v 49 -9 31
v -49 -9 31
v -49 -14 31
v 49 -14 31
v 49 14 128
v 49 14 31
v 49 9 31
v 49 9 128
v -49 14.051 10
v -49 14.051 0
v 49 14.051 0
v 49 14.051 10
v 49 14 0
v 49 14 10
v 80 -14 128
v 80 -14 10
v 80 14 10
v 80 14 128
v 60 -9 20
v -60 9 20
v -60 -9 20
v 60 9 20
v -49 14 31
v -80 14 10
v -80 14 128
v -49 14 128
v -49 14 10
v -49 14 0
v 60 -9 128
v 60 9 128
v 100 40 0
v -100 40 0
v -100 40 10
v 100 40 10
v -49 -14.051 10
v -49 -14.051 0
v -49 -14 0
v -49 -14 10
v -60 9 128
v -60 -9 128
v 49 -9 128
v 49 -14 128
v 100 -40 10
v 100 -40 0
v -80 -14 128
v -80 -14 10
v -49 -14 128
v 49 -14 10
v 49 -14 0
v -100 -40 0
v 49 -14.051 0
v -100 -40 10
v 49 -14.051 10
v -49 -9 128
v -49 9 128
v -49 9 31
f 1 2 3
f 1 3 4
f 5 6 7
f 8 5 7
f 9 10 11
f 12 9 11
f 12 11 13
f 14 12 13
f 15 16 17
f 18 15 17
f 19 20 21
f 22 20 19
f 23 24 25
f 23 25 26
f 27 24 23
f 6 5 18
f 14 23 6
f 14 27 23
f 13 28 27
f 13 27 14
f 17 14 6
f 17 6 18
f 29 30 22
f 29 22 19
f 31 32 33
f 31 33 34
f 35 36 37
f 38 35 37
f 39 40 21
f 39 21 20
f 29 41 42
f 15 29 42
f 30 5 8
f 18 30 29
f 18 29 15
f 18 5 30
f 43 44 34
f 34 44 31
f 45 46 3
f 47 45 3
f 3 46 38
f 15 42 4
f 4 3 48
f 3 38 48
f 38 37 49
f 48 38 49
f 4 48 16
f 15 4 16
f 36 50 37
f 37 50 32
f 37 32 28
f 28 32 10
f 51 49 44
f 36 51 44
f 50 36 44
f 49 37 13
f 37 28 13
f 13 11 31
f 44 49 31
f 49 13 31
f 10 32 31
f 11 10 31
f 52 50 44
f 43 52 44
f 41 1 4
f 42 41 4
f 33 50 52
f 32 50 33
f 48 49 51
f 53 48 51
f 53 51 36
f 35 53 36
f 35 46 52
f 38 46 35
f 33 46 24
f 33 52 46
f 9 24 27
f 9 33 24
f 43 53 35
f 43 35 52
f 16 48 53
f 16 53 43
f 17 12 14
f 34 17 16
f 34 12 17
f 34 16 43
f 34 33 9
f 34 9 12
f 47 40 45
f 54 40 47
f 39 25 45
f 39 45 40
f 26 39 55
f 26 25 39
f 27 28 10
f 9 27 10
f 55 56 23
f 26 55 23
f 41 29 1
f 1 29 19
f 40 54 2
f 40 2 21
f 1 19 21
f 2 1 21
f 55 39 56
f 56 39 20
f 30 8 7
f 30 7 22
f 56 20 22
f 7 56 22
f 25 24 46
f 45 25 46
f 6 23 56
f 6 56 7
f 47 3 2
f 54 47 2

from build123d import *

# Parameters (mm, degrees)
F0_W     = 200
F0_H     = 80
F0_W_2   = 98
F0_H_2   = 18
F0_H_3   = 5
F0_W_3   = 11
F1_DEPTH = 10
F2_DEPTH = 20
F3_DEPTH = 31
F4_DEPTH = 128


# Not quite as in the source:
# - a feature names something its author has since deleted; it is built from what else it names


with BuildPart() as f1:
    # F0 (on Top) → F1 (new body)
    with BuildSketch(Plane.XY):
        Rectangle(F0_W, F0_H)
        Polygon((80, 14), (80, -14), (49, -14), (49, -14.0508310869), (-49, -14.0508310869), (-49, -14), (-80, -14), (-80, 14), (-49, 14), (-49, 14.0508310869), (49, 14.0508310869), (49, 14), align=None, mode=Mode.SUBTRACT)
        Rectangle(F0_W_2, F0_H_2)
        Polygon((49, -14), (80, -14), (80, 14), (49, 14), (49, 9), (60, 9), (60, -9), (49, -9), align=None)
        Polygon((-80, -14), (-49, -14), (-49, -9), (-60, -9), (-60, 9), (-49, 9), (-49, 14), (-80, 14), align=None)
        with Locations((0, -11.5)):
            Rectangle(F0_W_2, F0_H_3)
        with Locations((0, 11.5)):
            Rectangle(F0_W_2, F0_H_3)
        with Locations((54.5, 0)):
            Rectangle(F0_W_3, F0_H_2)
        with Locations((-54.5, 0)):
            Rectangle(F0_W_3, F0_H_2)
    extrude(amount=F1_DEPTH)

    # F0 (on Top) → F2 (join)
    with BuildSketch(Plane.XY):
        Polygon((-80, -14), (-49, -14), (-49, -9), (-60, -9), (-60, 9), (-49, 9), (-49, 14), (-80, 14), align=None)
        with Locations((-54.5, 0)):
            Rectangle(F0_W_3, F0_H_2)
        Rectangle(F0_W_2, F0_H_2)
        with Locations((54.5, 0)):
            Rectangle(F0_W_3, F0_H_2)
        Polygon((49, -14), (80, -14), (80, 14), (49, 14), (49, 9), (60, 9), (60, -9), (49, -9), align=None)
        with Locations((0, -11.5)):
            Rectangle(F0_W_2, F0_H_3)
        with Locations((0, 11.5)):
            Rectangle(F0_W_2, F0_H_3)
    extrude(amount=F2_DEPTH)

    # F0 (on Top) → F3 (join)
    with BuildSketch(Plane.XY):
        Polygon((-80, -14), (-49, -14), (-49, -9), (-60, -9), (-60, 9), (-49, 9), (-49, 14), (-80, 14), align=None)
        with Locations((0, 11.5)):
            Rectangle(F0_W_2, F0_H_3)
        with Locations((0, -11.5)):
            Rectangle(F0_W_2, F0_H_3)
        Polygon((49, -14), (80, -14), (80, 14), (49, 14), (49, 9), (60, 9), (60, -9), (49, -9), align=None)
    extrude(amount=F3_DEPTH)

    # F0 (on Top) → F4 (join)
    with BuildSketch(Plane.XY):
        Polygon((-80, -14), (-49, -14), (-49, -9), (-60, -9), (-60, 9), (-49, 9), (-49, 14), (-80, 14), align=None)
        Polygon((49, -14), (80, -14), (80, 14), (49, 14), (49, 9), (60, 9), (60, -9), (49, -9), align=None)
    extrude(amount=F4_DEPTH)


solid = f1.part
